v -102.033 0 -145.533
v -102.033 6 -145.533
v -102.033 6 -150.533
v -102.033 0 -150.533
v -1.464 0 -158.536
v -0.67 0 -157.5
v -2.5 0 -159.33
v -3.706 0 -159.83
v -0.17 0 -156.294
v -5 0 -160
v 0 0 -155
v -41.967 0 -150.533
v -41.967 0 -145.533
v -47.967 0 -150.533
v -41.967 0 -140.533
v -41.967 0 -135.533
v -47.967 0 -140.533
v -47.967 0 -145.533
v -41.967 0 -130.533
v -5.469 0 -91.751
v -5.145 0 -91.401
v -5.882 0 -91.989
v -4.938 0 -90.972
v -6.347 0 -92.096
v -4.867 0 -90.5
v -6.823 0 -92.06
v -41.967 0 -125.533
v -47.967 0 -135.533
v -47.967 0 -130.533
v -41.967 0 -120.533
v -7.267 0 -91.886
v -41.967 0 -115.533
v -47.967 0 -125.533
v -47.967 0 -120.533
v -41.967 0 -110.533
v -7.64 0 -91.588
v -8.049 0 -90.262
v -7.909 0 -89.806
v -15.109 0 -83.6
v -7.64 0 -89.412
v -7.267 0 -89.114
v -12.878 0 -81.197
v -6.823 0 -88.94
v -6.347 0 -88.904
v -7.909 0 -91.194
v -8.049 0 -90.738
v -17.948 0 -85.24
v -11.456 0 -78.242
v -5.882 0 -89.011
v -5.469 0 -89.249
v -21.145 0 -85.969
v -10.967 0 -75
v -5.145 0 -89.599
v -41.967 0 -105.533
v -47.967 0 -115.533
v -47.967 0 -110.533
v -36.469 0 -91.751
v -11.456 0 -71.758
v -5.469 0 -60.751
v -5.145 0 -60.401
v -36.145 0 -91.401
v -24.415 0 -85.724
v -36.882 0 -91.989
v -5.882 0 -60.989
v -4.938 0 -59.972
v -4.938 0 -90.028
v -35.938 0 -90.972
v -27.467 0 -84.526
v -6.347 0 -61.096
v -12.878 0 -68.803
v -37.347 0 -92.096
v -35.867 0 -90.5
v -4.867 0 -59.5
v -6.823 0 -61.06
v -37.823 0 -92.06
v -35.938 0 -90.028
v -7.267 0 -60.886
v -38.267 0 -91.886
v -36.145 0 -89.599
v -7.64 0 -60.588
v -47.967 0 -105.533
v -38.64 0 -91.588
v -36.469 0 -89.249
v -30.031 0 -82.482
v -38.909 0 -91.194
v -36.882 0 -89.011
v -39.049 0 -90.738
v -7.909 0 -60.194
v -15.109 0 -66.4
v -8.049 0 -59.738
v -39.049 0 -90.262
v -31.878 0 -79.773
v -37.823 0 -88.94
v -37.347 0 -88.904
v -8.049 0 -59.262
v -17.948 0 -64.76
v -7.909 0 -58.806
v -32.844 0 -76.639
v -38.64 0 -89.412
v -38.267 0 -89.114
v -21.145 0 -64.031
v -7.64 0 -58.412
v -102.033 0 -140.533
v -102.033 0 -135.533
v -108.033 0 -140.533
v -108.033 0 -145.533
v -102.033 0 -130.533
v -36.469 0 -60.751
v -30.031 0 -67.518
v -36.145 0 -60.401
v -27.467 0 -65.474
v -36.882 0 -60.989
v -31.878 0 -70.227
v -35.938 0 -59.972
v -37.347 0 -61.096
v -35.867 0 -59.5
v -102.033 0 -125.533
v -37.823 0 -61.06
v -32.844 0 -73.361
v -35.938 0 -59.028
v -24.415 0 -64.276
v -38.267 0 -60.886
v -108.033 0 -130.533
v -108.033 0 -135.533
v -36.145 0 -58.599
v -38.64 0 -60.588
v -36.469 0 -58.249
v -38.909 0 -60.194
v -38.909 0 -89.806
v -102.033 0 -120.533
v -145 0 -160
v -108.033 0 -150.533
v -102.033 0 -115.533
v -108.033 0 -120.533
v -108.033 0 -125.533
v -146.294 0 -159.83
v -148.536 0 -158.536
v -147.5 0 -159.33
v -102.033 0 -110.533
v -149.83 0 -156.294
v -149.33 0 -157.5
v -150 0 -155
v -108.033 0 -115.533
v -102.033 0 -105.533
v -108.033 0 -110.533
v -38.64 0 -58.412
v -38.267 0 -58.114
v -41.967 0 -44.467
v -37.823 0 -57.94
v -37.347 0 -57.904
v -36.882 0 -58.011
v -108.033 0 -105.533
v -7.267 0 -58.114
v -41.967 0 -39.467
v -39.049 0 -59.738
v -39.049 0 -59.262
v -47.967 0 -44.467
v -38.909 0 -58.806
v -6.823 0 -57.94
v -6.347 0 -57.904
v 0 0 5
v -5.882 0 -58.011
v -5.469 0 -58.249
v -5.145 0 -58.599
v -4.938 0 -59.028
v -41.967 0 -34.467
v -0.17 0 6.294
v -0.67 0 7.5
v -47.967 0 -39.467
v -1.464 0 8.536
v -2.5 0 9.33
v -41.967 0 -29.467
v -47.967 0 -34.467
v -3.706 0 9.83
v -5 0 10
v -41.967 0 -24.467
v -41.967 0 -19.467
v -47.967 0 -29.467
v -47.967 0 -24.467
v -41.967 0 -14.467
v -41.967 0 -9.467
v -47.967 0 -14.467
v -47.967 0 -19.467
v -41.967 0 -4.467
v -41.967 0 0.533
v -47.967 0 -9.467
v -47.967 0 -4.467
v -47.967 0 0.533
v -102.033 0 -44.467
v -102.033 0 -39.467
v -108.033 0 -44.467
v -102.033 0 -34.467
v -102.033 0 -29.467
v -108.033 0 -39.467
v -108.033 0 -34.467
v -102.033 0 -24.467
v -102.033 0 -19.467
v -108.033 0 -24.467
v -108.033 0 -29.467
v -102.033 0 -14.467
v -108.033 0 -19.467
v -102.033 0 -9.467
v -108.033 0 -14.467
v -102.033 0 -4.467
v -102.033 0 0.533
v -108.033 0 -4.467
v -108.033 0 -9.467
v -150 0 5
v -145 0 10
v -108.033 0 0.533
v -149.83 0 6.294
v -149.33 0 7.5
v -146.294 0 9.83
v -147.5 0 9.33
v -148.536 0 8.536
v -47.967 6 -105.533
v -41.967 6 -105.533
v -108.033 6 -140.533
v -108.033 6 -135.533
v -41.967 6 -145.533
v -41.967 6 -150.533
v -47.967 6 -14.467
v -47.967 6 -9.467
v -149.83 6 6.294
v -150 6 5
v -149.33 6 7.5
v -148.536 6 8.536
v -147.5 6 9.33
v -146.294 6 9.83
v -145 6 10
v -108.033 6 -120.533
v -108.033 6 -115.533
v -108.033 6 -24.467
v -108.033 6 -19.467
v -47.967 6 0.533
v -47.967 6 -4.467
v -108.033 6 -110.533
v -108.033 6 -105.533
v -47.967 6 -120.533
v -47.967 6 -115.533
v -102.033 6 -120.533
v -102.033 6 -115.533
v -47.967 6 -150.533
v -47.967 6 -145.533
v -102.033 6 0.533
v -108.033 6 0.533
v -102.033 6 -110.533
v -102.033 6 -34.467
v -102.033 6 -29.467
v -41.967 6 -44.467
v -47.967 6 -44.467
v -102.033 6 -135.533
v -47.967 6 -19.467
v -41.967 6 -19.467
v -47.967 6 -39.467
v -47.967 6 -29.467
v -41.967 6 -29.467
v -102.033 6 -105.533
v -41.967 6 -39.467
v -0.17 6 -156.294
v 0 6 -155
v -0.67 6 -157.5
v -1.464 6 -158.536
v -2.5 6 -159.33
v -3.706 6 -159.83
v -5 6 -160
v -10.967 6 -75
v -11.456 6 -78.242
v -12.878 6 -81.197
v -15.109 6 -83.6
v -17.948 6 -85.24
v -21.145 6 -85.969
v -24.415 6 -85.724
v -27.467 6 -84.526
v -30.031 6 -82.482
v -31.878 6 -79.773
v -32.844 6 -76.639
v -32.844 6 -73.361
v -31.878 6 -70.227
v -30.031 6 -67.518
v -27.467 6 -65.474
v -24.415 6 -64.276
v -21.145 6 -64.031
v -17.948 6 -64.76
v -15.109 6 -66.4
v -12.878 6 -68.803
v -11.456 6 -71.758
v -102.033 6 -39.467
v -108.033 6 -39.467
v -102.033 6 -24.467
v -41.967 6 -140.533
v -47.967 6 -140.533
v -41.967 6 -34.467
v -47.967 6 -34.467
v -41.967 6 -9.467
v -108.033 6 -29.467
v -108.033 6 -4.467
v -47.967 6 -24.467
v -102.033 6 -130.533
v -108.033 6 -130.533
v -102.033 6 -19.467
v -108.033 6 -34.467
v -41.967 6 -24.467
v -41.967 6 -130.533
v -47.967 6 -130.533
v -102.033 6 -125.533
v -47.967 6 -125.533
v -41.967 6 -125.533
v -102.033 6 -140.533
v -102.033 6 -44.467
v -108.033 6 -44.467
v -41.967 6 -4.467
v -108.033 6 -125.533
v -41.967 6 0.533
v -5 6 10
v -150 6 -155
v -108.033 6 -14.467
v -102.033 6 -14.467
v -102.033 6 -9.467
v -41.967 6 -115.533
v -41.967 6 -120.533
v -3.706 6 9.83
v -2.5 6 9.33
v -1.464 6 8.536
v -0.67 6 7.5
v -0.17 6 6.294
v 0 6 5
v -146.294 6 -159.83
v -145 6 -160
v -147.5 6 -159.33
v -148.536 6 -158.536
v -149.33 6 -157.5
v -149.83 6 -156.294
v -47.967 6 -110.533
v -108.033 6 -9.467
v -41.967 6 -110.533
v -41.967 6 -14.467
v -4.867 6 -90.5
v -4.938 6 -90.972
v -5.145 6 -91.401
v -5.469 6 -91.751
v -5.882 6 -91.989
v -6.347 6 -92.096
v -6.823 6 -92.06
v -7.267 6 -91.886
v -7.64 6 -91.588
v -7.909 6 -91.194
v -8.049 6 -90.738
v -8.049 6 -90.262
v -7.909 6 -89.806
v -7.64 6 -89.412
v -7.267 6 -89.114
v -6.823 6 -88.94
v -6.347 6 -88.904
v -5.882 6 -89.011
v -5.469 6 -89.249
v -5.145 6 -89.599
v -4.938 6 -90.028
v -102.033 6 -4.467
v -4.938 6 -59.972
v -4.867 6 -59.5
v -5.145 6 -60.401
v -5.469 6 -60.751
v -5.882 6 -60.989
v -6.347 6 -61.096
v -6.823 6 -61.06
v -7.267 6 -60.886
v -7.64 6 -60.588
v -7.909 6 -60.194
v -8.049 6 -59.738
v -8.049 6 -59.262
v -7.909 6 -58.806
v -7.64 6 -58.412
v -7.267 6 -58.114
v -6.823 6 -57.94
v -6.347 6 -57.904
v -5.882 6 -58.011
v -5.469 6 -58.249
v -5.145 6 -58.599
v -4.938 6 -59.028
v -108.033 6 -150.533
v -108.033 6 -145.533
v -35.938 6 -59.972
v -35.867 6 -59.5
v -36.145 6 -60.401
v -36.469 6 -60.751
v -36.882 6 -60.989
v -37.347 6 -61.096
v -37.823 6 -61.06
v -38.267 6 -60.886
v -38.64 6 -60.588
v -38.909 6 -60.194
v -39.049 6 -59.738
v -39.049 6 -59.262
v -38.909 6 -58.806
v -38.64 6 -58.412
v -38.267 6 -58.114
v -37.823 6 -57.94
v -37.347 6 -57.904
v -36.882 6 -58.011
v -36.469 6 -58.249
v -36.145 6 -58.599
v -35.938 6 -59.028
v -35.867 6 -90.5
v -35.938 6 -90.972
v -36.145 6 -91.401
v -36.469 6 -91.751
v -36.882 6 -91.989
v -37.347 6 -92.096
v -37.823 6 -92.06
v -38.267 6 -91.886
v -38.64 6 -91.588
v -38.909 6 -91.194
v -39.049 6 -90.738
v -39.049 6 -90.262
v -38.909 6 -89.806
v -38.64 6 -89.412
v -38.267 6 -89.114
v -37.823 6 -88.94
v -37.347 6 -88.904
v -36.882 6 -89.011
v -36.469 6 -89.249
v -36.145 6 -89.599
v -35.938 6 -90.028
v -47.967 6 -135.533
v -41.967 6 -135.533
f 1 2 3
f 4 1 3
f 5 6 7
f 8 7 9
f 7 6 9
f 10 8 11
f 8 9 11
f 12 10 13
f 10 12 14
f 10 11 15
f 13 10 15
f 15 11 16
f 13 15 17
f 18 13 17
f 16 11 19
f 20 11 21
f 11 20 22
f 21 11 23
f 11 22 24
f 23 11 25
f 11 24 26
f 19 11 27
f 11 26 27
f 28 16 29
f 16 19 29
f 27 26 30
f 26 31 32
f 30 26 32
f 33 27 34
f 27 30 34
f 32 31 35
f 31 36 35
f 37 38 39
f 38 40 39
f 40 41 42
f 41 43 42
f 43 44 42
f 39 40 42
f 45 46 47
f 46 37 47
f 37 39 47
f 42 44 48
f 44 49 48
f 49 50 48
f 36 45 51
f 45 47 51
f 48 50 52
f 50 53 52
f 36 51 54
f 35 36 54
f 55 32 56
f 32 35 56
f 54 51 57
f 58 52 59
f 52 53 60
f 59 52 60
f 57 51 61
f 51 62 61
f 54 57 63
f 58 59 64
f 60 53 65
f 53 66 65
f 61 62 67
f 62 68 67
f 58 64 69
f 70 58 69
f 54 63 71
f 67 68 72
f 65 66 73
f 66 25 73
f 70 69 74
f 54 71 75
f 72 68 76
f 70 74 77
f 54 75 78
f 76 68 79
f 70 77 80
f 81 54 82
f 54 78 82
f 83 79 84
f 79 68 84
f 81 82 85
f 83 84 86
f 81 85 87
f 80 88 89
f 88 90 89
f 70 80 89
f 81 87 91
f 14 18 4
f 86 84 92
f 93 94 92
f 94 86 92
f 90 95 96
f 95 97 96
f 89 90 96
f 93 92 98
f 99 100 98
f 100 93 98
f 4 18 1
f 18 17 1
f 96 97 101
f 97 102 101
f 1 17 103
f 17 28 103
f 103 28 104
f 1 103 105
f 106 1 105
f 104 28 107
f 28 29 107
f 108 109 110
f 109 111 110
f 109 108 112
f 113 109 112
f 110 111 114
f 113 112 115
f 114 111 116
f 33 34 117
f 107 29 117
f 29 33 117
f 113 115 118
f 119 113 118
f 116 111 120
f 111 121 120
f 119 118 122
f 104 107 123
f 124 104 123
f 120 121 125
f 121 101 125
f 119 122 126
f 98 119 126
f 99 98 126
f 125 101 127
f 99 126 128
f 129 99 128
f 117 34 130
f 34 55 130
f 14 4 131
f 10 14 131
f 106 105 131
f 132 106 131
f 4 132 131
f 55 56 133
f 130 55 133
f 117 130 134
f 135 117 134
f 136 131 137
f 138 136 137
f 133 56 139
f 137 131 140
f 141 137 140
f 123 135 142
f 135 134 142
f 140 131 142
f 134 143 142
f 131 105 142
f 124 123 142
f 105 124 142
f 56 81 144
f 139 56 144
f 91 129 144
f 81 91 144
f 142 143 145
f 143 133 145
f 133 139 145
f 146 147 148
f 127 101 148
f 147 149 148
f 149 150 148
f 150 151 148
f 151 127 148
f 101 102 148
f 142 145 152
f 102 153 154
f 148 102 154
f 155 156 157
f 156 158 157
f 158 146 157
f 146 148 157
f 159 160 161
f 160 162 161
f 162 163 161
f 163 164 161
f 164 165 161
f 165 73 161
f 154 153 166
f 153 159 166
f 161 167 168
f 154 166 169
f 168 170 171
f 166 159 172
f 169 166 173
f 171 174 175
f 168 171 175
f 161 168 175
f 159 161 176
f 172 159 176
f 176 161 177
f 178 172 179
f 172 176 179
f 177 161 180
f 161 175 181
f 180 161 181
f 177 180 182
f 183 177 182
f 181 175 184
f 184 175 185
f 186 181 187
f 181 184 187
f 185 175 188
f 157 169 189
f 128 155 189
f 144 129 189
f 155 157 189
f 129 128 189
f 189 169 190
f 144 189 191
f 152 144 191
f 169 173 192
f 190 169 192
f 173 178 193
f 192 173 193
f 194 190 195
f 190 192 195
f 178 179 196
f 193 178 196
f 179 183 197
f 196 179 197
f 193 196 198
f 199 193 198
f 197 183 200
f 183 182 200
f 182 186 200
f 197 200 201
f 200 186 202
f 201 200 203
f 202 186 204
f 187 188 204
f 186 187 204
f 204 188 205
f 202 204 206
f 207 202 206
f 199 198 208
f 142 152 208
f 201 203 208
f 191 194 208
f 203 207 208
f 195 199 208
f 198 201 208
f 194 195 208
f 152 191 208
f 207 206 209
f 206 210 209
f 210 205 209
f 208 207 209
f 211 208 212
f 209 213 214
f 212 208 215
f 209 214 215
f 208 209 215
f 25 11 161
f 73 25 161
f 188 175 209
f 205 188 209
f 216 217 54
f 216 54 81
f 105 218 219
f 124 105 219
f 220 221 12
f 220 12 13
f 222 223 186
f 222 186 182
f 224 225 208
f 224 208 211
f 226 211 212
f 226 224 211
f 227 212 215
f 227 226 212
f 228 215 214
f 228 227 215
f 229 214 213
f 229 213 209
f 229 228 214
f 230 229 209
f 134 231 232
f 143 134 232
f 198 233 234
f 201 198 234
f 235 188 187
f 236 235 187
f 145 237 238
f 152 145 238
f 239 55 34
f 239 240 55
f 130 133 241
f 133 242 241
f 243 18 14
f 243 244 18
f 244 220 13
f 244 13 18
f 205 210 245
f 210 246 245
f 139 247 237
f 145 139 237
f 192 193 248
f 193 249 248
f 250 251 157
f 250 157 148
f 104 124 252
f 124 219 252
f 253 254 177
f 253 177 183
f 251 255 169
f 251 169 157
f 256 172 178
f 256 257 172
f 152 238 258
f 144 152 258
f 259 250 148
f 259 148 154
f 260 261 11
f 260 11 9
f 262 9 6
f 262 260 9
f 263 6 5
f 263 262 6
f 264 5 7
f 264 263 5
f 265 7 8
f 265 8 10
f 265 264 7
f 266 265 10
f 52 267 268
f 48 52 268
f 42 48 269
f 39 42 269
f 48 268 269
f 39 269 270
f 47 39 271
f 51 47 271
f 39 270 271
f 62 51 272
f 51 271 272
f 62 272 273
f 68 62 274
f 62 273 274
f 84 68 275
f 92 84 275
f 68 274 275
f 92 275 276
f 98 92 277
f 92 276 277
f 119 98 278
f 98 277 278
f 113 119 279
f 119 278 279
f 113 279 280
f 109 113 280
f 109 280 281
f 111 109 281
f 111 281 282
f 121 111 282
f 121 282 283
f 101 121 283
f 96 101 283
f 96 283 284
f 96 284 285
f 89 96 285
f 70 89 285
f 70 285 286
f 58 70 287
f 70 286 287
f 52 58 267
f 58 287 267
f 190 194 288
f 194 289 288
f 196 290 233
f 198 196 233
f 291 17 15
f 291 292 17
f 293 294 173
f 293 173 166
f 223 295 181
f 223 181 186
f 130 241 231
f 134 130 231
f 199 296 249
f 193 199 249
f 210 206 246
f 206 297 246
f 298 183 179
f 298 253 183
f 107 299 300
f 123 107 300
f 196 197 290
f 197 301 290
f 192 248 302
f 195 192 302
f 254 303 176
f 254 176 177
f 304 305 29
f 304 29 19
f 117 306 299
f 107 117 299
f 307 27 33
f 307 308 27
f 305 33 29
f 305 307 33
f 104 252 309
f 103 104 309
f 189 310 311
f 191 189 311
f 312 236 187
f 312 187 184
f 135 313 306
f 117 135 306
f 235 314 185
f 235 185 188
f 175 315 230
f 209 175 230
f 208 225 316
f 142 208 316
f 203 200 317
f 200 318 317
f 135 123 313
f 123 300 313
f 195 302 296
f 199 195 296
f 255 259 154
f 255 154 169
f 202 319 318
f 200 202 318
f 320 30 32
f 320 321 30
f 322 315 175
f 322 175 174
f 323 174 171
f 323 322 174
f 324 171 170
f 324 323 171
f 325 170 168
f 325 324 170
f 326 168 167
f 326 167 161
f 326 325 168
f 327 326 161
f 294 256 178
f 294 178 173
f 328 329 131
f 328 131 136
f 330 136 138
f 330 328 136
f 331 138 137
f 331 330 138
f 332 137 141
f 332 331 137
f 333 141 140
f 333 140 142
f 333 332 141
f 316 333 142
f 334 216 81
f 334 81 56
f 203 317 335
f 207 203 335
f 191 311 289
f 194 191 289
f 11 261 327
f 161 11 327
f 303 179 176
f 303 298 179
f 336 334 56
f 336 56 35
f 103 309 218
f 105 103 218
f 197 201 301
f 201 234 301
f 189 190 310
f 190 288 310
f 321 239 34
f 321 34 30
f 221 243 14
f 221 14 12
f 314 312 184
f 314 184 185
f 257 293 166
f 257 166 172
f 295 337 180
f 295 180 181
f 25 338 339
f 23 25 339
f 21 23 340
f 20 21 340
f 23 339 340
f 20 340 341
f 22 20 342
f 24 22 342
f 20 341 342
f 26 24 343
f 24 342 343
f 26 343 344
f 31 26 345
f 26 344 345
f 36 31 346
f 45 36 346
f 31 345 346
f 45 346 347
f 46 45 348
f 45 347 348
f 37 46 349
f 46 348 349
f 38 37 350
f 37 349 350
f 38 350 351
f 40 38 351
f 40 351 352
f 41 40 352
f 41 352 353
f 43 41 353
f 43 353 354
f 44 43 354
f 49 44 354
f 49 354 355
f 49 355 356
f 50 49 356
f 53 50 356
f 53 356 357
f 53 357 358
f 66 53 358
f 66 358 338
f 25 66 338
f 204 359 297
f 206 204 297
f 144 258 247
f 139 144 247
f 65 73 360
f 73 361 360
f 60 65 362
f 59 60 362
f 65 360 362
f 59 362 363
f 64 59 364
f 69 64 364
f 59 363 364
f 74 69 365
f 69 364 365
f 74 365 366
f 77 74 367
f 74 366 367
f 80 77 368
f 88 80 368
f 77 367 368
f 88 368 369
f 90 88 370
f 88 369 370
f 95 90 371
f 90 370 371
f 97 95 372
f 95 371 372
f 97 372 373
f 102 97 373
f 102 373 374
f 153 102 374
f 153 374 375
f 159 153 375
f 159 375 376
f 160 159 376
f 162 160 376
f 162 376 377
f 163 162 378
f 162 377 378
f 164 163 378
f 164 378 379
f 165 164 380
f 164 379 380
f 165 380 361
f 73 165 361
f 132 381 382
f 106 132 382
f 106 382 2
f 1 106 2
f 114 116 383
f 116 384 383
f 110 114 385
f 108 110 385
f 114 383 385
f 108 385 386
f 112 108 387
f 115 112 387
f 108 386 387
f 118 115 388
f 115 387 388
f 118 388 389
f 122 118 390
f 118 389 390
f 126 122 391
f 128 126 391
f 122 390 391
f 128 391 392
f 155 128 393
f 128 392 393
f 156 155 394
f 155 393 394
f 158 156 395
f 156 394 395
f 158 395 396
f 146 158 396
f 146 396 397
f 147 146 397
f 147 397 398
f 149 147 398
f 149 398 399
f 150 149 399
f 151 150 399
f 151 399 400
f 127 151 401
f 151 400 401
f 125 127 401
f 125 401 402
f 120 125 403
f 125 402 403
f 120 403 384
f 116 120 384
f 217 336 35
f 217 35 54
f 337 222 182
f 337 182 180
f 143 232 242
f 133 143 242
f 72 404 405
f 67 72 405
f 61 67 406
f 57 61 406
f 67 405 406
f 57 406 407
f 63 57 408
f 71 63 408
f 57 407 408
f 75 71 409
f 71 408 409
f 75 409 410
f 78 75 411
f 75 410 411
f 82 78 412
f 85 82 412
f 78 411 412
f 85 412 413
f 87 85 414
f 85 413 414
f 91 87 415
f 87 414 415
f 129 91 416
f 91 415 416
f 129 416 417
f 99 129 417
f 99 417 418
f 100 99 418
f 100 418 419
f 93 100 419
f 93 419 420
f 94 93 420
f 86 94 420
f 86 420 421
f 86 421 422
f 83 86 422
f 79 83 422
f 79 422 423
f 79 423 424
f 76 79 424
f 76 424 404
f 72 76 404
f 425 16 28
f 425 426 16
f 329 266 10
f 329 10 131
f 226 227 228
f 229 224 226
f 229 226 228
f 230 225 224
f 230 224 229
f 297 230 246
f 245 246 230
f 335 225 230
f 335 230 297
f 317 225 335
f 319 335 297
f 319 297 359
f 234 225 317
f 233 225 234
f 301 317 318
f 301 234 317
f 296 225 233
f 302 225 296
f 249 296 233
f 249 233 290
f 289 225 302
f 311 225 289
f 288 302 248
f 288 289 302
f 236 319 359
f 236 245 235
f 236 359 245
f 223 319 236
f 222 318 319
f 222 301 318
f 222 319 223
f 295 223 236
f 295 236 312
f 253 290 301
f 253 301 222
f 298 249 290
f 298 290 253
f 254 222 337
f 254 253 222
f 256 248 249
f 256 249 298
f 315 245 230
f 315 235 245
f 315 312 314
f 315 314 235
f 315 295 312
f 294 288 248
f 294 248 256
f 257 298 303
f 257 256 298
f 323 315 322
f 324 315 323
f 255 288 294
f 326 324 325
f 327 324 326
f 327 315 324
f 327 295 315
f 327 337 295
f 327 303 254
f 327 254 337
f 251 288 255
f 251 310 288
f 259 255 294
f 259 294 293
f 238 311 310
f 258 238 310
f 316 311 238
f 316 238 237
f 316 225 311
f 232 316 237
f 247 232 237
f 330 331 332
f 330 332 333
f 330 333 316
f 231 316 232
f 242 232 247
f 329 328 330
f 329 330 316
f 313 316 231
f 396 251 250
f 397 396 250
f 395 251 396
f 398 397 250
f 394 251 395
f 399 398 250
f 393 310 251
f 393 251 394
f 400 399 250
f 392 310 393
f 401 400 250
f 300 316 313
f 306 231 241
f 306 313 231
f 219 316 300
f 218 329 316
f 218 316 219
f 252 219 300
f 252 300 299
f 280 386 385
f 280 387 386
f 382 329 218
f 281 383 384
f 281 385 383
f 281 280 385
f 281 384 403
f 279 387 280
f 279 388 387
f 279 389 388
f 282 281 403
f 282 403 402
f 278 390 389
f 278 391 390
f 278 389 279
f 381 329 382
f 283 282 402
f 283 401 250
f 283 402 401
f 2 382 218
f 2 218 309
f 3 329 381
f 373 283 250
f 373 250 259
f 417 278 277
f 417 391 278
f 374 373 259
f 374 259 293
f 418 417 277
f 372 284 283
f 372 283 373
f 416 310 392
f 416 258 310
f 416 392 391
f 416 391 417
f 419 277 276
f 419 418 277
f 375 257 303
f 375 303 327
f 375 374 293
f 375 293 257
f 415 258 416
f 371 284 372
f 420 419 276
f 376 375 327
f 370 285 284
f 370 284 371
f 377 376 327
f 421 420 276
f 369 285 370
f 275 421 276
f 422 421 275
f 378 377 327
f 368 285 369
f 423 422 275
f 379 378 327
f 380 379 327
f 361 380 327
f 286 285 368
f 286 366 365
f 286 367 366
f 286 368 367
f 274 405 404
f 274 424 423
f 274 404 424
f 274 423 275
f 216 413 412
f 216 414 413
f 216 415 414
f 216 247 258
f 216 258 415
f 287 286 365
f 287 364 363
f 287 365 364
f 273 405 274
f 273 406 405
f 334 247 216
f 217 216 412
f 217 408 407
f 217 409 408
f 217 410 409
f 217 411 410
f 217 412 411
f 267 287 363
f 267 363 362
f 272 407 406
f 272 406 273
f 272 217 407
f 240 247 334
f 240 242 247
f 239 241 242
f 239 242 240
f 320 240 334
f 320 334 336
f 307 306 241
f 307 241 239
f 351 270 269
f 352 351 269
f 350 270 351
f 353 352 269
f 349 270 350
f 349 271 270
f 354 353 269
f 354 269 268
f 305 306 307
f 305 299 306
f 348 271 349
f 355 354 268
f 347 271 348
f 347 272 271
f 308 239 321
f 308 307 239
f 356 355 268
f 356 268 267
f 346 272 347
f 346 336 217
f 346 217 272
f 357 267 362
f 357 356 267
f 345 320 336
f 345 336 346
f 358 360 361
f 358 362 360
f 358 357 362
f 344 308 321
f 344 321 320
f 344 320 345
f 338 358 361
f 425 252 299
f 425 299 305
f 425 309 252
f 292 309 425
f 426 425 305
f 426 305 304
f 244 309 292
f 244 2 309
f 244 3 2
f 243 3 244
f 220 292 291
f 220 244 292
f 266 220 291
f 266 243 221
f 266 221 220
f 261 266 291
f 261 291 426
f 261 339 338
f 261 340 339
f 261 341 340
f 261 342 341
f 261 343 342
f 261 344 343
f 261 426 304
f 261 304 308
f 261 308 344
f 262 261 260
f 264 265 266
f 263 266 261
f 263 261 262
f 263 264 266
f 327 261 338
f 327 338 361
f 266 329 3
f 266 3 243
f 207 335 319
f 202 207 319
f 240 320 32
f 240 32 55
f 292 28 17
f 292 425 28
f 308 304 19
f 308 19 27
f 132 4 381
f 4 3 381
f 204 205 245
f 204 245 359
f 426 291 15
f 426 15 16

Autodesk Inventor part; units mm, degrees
ref_plane "YZ Plane" through (0, 0, 0) normal (1, 0, 0) x (0, 1, 0)
ref_plane "XZ Plane" through (0, 0, 0) normal (0, 1, 0) x (-1, 0, 0)
ref_plane "XY Plane" through (0, 0, 0) normal (0, 0, 1) x (1, 0, 0)
sketch "Sketch1" plane through (0, 0, 0) normal (0, 1, 0) x (-1, 0, 0)
  line L0 (5, 0) -> (145, 0)
  line L1 (150, -5) -> (150, -145)
  line L2 (145, -150) -> (5, -150)
  line L3 (0, -145) -> (0, -5)
  arc A0 (150, -5) -> (145, 0) centre (145, -5) ccw
  arc A1 (145, -150) -> (150, -145) centre (145, -145) ccw
  arc A2 (5, 0) -> (0, -5) centre (5, -5) ccw
  arc A3 (0, -145) -> (5, -150) centre (5, -145) ccw
  circle A4 centre (128.033, -128.033) radius 5
  circle A5 centre (128.033, -21.967) radius 5
  circle A6 centre (21.967, -21.967) radius 5
  circle A7 centre (21.967, -128.033) radius 5
  point P0 (0, 0)
  point P1 (150, -150)
  point P2 (150, 0)
  point P3 (0, -150)
  dimension "d0" = 150
  dimension "d1" = 150
  dimension "d2" = 5
  dimension "d9" = 10
  dimension "d10" = 10
  dimension "d11" = 10
  dimension "d12" = 10
extrude "Extrusion1" add sketch "Sketch1" along normal blind 6
sketch "Sketch2" plane through (0, 6, 0) normal (0, 1, 0) x (1, 0, 0)
  line L0 (0, 5) -> (0, 145) projected
  circle A0 centre (-21.967, 21.967) radius 5 projected
  circle A1 centre (-21.967, 75) radius 11
  circle A2 centre (-37.467, 59.5) radius 1.6
  circle A3 centre (-37.467, 90.5) radius 1.6
  circle A4 centre (-6.467, 59.5) radius 1.6
  circle A5 centre (-6.467, 90.5) radius 1.6
  line L1 (-5, 150) -> (-145, 150) projected
  point P0 (0, 0)
  dimension "d15" = 22
  dimension "d21" = 3.2
  dimension "d22" = 3.2
  dimension "d23" = 3.2
  dimension "d24" = 3.2
  dimension "d65" = 31
extrude "Extrusion2" cut sketch "Sketch2" against normal blind 6 contours A1 | A2 | A3 | A4 | A5
sketch "Sketch3" plane through (0, 6, 0) normal (0, 1, 0) x (1, 0, 0)
  circle A0 centre (-128.033, 128.033) radius 5 projected
  arc A1 (-145, 150) -> (-150, 145) centre (-145, 145) ccw projected
  line L0 (-150, 145) -> (0, 145)
  line L1 (0, 145) -> (0, 155)
  line L2 (-5, 160) -> (-145, 160)
  line L3 (-150, 155) -> (-150, 145)
  arc A2 (-150, 5) -> (-145, 0) centre (-145, 5) ccw projected
  line L4 (-150, 5) -> (0, 5)
  line L5 (0, 5) -> (0, -5)
  line L6 (-5, -10) -> (-145, -10)
  line L7 (-150, -5) -> (-150, 5)
  arc A3 (-145, 160) -> (-150, 155) centre (-145, 155) ccw
  arc A4 (0, 155) -> (-5, 160) centre (-5, 155) ccw
  arc A5 (-150, -5) -> (-145, -10) centre (-145, -5) ccw
  arc A6 (-5, -10) -> (0, -5) centre (-5, -5) ccw
  point P0 (0, 0)
  point P1 (0, 160)
  point P2 (-150, 160)
  point P3 (0, -10)
  point P4 (-150, -10)
  dimension "d29" = 150
  dimension "d30" = 15
  dimension "d31" = 150
  dimension "d32" = 15
  dimension "d33" = 5
extrude "Extrusion3" add sketch "Sketch3" against normal blind 6 contours L3 A3 L2 A4 L1 L0 | L4 L5 A6 L6 A5 L7
sketch "Sketch4" plane through (0, 6, 0) normal (0, 1, 0) x (1, 0, 0)
  circle A0 centre (-128.033, 128.033) radius 5 projected
  line L0 (-108.033, 105.533) -> (-102.033, 105.533)
  line L1 (-102.033, 105.533) -> (-102.033, 110.533)
  line L2 (-102.033, 110.533) -> (-108.033, 110.533)
  line L3 (-108.033, 110.533) -> (-108.033, 105.533)
  circle A1 centre (-21.967, 128.033) radius 5 projected
  line L4 (-41.967, 105.533) -> (-47.967, 105.533)
  line L5 (-47.967, 105.533) -> (-47.967, 110.533)
  line L6 (-47.967, 110.533) -> (-41.967, 110.533)
  line L7 (-41.967, 110.533) -> (-41.967, 105.533)
  circle A2 centre (-128.033, 21.967) radius 5 projected
  line L8 (-108.033, -0.533) -> (-102.033, -0.533)
  line L9 (-102.033, -0.533) -> (-102.033, 4.467)
  line L10 (-102.033, 4.467) -> (-108.033, 4.467)
  line L11 (-108.033, 4.467) -> (-108.033, -0.533)
  circle A3 centre (-21.967, 21.967) radius 5 projected
  line L12 (-41.967, -0.533) -> (-47.967, -0.533)
  line L13 (-47.967, -0.533) -> (-47.967, 4.467)
  line L14 (-47.967, 4.467) -> (-41.967, 4.467)
  line L15 (-41.967, 4.467) -> (-41.967, -0.533)
  point P0 (0, 0)
  dimension "d39" = 6
  dimension "d40" = 5
  dimension "d43" = 6
  dimension "d44" = 5
  dimension "d47" = 6
  dimension "d48" = 5
  dimension "d51" = 6
  dimension "d52" = 5
extrude "Extrusion4" cut sketch "Sketch4" against normal blind 6 contours L3 L2 L1 L0 | L4 L5 L6 L7 | L11 L10 L9 L8 | L12 L13 L14 L15
pattern_linear "Rectangular Pattern1" count 5 spacing 10 along (0, 0, -1) of "Extrusion4"
sketch "Sketch5" plane through (0, 6, 0) normal (0, 1, 0) x (1, 0, 0)
  circle A0 centre (-128.033, 21.967) radius 5 projected
  circle A1 centre (-128.033, 21.967) radius 5
  circle A2 centre (-128.033, 128.033) radius 5 projected
  circle A3 centre (-128.033, 128.033) radius 5
  circle A4 centre (-21.967, 128.033) radius 5 projected
  circle A5 centre (-21.967, 128.033) radius 5
  circle A6 centre (-21.967, 21.967) radius 5 projected
  circle A7 centre (-21.967, 21.967) radius 5
  point P0 (0, 0)
  dimension "d58" = 10
  dimension "d59" = 10
  dimension "d60" = 10
  dimension "d61" = 10
extrude "Extrusion5" add sketch "Sketch5" against normal blind 6
properties part number "e_top 1"
